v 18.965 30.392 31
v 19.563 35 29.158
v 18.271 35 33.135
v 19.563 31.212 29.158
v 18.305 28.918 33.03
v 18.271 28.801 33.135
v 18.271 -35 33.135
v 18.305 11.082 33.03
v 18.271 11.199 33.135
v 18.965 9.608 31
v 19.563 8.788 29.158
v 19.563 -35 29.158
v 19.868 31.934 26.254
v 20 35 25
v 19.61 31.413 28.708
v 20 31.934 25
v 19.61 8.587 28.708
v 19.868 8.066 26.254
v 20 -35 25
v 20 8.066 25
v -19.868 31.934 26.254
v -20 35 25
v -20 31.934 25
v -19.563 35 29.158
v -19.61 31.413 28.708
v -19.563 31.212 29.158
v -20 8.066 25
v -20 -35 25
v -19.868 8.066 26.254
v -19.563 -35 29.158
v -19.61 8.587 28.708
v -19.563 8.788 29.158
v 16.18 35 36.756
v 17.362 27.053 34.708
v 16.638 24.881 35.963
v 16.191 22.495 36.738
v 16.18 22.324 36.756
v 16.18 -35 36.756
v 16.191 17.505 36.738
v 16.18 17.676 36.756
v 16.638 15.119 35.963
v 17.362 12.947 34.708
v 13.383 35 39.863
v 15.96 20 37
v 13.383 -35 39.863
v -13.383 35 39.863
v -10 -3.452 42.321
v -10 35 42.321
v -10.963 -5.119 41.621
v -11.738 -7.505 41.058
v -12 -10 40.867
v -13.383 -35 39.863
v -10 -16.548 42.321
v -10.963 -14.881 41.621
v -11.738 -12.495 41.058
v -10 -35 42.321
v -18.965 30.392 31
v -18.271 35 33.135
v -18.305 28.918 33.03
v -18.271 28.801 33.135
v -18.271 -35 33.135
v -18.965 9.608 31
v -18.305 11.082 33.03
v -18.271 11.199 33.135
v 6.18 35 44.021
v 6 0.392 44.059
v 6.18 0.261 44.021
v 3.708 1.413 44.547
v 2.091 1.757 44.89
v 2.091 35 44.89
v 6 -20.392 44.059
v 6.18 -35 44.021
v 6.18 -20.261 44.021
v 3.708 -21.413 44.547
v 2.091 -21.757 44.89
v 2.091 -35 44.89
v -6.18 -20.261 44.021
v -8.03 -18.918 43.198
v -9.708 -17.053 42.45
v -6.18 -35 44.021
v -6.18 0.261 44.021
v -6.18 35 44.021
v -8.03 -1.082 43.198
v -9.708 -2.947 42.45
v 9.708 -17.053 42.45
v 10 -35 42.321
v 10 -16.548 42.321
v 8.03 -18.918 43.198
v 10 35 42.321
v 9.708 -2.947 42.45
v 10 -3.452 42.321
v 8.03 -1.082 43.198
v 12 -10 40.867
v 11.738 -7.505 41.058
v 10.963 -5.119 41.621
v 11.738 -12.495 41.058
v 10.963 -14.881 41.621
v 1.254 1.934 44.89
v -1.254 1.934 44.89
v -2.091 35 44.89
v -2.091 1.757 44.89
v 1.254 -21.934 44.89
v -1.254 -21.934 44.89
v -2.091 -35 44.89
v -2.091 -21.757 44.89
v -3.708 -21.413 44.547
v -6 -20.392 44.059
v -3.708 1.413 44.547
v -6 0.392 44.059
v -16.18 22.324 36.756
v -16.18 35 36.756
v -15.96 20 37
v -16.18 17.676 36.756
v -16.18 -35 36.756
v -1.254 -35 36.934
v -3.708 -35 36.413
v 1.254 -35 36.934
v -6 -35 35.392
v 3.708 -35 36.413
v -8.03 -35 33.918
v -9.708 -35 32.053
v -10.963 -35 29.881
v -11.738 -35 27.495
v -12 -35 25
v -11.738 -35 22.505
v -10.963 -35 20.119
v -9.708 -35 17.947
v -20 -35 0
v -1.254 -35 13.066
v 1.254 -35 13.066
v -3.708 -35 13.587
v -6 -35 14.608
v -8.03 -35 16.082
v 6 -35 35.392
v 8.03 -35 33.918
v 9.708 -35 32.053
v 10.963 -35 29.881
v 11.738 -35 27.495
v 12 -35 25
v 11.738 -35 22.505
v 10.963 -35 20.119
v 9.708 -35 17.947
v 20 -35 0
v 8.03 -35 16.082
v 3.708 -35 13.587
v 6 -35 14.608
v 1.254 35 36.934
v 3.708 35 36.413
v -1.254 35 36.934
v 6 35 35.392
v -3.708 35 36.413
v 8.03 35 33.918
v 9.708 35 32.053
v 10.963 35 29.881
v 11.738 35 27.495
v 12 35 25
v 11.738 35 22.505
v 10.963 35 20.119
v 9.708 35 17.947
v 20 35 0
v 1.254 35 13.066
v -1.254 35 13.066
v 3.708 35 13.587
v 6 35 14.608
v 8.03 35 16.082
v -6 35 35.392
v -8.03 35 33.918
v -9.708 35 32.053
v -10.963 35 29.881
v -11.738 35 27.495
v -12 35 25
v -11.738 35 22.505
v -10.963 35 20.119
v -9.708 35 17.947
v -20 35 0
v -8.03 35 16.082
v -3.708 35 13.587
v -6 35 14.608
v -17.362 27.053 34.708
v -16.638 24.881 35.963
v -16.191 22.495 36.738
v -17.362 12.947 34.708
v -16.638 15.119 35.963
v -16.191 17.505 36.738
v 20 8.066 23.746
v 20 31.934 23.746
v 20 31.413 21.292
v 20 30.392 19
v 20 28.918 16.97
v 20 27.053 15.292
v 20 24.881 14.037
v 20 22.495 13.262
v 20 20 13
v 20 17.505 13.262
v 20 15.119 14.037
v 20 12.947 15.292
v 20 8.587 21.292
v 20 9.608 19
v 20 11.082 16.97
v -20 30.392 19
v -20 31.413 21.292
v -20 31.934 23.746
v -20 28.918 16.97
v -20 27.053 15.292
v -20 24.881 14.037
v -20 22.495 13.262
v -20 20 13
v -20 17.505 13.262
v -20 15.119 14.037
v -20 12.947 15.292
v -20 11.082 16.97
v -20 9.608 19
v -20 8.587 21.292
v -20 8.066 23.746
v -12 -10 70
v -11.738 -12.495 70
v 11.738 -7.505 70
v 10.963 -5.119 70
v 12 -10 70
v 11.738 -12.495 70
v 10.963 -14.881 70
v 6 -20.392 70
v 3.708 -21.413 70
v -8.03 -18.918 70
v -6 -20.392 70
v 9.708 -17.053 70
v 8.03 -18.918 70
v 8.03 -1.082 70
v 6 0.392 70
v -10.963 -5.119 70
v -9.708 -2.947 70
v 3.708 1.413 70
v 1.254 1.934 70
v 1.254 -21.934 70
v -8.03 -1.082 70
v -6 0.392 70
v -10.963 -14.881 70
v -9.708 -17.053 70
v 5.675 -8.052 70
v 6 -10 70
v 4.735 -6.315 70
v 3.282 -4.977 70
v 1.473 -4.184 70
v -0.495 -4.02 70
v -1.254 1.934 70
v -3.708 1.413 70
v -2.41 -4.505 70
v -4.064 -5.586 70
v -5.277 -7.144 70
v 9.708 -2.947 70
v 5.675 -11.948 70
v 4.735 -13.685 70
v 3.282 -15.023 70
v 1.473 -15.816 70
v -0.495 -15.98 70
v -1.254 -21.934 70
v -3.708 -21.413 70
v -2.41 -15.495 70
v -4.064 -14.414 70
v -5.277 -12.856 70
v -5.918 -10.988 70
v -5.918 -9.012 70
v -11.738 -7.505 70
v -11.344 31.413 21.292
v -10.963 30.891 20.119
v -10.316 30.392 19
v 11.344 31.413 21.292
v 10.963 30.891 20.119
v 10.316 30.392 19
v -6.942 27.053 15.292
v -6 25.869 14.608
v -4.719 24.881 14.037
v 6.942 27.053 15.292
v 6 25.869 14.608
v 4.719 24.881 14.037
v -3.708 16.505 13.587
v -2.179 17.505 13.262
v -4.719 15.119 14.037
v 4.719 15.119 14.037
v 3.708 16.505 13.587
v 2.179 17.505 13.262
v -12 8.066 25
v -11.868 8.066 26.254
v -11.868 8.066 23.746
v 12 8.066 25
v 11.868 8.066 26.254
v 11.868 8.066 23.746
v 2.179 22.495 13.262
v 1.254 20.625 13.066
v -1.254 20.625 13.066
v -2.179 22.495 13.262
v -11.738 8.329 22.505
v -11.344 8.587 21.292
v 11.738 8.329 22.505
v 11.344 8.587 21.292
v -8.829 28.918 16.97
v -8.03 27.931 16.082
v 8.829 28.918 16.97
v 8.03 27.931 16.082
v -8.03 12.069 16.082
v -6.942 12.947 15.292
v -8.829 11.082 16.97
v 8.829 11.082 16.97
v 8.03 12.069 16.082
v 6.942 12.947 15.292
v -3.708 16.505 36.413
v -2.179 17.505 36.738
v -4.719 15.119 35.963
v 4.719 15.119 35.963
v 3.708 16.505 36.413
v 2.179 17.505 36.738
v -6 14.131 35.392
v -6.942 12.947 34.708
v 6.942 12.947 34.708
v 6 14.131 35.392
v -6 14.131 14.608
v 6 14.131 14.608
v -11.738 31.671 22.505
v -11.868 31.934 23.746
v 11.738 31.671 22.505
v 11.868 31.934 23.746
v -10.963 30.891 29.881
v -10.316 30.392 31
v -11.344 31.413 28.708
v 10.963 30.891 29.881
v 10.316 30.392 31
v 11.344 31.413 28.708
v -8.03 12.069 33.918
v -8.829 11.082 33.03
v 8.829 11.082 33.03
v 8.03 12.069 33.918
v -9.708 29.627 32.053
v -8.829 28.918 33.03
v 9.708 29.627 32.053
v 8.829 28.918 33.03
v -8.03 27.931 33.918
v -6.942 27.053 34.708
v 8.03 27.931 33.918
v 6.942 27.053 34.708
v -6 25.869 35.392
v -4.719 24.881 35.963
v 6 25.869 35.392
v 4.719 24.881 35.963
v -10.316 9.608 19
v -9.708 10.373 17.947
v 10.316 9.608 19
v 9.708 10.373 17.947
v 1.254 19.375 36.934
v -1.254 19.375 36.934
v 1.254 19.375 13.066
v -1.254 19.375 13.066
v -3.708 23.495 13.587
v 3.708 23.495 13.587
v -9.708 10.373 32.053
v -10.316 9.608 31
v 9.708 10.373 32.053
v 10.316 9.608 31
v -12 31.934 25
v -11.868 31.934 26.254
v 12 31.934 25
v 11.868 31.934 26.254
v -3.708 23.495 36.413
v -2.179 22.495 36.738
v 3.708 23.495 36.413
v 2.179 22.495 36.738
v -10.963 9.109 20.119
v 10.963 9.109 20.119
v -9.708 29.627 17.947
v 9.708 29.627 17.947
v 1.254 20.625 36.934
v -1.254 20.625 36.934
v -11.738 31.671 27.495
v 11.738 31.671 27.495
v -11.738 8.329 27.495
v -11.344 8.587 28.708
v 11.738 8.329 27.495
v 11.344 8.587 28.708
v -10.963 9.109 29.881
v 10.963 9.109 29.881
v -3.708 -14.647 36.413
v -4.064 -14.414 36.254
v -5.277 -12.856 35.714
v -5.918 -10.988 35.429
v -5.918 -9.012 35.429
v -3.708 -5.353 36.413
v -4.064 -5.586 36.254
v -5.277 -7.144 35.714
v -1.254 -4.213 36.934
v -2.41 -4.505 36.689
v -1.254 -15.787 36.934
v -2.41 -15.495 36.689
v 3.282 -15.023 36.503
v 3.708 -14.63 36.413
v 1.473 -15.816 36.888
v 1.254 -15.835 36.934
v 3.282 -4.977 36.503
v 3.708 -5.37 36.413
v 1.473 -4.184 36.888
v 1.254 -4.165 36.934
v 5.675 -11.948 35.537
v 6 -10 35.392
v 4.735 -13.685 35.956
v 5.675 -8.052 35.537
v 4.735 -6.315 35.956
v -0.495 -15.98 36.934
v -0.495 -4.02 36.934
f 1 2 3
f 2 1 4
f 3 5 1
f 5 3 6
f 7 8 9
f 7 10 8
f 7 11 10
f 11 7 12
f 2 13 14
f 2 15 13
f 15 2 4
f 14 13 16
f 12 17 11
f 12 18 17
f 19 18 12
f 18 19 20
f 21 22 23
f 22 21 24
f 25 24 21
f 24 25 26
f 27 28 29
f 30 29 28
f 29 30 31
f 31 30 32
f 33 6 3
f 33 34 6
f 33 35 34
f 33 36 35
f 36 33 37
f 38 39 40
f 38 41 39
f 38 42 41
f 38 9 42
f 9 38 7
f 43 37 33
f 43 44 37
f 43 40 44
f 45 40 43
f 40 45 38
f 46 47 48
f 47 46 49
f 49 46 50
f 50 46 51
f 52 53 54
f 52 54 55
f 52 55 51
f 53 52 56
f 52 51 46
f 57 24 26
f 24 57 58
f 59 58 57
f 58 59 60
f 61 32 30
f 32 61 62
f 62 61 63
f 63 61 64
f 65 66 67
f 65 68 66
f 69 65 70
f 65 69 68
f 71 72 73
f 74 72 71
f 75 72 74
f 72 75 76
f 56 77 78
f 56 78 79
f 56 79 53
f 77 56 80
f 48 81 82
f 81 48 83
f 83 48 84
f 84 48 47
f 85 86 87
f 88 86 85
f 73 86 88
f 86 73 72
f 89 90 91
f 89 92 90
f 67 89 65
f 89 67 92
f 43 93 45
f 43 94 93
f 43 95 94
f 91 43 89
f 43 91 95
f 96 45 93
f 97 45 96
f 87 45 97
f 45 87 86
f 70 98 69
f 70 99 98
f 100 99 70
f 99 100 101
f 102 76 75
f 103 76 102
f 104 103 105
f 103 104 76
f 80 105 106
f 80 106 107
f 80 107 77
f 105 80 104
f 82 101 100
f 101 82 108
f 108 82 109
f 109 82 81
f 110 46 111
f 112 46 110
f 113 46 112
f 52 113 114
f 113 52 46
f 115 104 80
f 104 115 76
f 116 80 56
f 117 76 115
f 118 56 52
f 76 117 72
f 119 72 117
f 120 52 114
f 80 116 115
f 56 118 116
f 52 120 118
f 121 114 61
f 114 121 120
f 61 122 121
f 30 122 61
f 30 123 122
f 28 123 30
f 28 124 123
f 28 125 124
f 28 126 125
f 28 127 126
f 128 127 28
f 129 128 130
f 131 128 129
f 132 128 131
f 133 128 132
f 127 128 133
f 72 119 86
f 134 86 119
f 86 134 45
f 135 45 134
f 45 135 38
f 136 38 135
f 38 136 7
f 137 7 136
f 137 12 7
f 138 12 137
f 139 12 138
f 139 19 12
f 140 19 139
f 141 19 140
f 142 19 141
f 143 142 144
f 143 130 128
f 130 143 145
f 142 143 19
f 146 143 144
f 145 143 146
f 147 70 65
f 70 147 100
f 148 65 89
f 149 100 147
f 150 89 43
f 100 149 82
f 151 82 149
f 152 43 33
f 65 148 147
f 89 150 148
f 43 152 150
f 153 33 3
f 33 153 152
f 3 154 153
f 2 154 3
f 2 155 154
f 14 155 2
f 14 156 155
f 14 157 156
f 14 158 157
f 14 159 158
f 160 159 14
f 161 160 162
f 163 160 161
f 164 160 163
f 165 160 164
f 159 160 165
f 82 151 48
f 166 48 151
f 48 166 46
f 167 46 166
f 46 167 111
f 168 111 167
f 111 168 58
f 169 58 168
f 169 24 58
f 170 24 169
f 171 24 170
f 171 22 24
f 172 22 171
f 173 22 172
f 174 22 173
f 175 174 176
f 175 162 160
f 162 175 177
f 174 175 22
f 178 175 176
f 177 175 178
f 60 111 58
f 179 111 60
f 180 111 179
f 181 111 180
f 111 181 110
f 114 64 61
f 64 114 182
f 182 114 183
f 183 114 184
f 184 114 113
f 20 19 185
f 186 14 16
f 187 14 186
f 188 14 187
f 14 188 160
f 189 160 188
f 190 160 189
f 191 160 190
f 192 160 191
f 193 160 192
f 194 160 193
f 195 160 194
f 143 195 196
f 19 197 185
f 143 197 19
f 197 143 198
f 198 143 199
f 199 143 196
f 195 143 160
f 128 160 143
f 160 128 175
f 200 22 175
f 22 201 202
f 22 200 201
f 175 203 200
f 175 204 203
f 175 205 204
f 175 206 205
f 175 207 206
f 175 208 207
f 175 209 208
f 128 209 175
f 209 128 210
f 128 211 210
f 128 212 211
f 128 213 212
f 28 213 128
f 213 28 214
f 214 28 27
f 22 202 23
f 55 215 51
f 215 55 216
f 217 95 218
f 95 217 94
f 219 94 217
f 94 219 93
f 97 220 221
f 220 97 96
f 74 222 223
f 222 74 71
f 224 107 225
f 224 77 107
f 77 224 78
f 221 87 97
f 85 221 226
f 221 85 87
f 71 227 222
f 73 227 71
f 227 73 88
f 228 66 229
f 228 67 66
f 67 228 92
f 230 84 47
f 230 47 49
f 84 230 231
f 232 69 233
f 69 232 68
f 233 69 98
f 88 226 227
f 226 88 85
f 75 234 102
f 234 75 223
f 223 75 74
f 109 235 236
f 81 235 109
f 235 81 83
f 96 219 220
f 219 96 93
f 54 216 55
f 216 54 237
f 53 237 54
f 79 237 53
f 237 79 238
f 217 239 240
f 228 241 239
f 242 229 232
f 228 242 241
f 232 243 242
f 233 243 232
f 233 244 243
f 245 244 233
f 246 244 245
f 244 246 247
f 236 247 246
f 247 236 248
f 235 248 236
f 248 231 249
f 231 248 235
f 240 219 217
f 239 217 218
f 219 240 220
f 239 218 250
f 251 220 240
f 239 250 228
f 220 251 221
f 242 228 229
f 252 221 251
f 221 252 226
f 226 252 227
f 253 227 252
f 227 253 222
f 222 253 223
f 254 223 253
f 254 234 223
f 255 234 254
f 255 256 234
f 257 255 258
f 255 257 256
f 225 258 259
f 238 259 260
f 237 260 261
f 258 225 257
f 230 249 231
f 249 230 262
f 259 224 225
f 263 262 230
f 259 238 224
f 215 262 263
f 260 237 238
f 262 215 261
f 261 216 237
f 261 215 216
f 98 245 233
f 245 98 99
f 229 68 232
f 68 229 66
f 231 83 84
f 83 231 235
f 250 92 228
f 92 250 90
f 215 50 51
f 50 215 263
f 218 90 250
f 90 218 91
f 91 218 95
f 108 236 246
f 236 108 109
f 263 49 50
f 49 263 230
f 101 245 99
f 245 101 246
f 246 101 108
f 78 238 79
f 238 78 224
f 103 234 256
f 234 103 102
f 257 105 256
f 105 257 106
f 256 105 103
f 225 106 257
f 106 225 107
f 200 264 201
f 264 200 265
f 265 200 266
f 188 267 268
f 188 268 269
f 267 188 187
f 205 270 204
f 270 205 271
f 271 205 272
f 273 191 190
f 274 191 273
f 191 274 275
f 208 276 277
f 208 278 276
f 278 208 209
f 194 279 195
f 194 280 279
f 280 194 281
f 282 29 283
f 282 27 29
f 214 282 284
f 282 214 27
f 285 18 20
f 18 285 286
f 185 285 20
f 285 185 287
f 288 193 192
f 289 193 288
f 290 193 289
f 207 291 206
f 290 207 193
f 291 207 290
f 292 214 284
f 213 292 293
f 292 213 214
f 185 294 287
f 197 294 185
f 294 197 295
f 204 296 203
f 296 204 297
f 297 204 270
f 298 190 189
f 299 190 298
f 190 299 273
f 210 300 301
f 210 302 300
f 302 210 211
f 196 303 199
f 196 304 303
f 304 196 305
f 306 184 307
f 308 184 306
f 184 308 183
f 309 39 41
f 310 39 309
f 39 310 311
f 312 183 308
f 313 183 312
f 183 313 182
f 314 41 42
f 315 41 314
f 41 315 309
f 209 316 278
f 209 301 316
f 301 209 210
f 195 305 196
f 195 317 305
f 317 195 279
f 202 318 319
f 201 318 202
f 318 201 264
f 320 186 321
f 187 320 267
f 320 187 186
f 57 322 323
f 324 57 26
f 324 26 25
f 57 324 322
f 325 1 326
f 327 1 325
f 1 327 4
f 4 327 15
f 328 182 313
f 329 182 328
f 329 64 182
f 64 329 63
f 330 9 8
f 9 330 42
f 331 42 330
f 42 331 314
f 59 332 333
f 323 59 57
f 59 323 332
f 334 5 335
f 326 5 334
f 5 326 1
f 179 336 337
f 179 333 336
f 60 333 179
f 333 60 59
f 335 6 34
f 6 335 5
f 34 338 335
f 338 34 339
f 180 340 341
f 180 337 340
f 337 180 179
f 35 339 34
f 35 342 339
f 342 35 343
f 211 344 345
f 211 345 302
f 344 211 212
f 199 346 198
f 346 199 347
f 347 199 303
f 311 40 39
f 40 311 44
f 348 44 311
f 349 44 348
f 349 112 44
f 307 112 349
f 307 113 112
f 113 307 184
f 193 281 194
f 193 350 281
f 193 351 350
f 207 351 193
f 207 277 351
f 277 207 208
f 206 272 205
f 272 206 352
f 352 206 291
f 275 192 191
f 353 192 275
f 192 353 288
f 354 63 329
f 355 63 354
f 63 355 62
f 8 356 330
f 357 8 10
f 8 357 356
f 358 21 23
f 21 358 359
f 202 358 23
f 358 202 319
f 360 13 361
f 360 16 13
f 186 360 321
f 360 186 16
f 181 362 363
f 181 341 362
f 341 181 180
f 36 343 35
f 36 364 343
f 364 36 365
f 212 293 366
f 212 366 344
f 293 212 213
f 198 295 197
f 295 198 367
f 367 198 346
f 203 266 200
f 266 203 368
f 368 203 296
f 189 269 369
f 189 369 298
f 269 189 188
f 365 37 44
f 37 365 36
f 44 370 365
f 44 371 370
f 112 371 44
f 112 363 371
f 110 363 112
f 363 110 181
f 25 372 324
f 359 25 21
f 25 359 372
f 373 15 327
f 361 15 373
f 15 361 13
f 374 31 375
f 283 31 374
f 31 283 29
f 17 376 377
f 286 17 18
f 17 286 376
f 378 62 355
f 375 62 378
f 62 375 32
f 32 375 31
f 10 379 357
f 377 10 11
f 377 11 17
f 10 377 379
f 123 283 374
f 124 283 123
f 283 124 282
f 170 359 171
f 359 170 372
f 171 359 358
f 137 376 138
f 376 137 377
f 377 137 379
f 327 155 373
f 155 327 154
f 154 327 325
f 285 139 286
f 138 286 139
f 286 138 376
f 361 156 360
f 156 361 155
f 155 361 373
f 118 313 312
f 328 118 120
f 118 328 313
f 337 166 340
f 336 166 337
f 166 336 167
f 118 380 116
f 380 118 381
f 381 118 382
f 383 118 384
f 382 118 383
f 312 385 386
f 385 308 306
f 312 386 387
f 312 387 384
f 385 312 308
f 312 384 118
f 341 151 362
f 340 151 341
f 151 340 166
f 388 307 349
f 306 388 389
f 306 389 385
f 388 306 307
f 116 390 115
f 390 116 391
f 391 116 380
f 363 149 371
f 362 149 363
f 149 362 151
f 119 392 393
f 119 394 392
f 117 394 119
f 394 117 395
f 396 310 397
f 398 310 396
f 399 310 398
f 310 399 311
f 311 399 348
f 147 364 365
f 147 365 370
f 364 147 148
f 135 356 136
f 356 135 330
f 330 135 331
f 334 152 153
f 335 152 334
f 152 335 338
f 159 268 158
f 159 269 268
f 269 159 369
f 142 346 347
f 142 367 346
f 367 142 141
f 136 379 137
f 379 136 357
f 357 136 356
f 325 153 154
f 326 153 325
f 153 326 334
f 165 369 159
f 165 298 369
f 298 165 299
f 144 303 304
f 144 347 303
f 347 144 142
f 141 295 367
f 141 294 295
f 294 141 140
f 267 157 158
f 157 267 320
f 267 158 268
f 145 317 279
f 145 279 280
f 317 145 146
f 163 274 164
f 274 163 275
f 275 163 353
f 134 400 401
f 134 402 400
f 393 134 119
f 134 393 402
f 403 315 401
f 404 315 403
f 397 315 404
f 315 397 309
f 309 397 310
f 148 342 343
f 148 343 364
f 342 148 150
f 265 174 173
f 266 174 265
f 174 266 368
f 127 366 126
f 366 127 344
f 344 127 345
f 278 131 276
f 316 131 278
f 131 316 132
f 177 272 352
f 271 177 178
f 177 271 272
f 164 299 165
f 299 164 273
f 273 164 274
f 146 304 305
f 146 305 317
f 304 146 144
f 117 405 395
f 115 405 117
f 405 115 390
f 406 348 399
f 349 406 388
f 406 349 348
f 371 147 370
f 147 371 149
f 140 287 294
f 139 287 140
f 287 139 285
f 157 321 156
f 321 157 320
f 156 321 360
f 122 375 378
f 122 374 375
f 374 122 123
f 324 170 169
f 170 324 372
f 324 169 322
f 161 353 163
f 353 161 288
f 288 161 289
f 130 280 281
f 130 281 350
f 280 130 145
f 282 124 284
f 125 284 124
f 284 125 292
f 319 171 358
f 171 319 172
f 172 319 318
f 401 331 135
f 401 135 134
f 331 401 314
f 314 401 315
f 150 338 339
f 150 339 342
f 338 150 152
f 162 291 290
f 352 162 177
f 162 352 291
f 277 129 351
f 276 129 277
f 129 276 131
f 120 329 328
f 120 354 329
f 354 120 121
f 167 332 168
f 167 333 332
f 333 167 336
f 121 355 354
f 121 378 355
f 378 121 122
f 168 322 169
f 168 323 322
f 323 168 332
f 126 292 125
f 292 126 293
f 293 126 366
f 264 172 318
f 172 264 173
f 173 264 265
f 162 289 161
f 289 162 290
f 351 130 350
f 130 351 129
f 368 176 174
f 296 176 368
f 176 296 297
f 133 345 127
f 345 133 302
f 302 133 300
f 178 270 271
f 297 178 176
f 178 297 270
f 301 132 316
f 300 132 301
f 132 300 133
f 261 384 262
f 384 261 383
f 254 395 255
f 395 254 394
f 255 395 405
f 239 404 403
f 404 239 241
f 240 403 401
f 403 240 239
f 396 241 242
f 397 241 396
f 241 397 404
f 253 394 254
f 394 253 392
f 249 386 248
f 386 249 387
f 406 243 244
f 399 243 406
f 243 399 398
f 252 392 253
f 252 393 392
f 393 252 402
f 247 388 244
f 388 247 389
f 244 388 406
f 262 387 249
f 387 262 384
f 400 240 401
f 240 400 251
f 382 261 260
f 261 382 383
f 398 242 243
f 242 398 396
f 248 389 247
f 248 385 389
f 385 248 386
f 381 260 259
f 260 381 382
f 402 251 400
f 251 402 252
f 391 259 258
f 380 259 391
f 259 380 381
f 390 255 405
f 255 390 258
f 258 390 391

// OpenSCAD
difference()
{
union(){
	translate([0,0,25]) rotate([90,0,0]) cylinder(r=20,h=70,center=true);
	translate([0,0,12.5]) cube([40,70,25],center=true);
	translate([0,-10,50]) cylinder(r=12,h=40,center=true);
}
union(){
	translate([0,20,25]) rotate([0,90,0]) cylinder(r=12,h=100,center=true);
	translate([0,0,25]) rotate([90,0,0]) cylinder(r=12,h=75,center=true);
	translate([0,-10,50]) cylinder(r=6,h=41,center=true);
}
}
